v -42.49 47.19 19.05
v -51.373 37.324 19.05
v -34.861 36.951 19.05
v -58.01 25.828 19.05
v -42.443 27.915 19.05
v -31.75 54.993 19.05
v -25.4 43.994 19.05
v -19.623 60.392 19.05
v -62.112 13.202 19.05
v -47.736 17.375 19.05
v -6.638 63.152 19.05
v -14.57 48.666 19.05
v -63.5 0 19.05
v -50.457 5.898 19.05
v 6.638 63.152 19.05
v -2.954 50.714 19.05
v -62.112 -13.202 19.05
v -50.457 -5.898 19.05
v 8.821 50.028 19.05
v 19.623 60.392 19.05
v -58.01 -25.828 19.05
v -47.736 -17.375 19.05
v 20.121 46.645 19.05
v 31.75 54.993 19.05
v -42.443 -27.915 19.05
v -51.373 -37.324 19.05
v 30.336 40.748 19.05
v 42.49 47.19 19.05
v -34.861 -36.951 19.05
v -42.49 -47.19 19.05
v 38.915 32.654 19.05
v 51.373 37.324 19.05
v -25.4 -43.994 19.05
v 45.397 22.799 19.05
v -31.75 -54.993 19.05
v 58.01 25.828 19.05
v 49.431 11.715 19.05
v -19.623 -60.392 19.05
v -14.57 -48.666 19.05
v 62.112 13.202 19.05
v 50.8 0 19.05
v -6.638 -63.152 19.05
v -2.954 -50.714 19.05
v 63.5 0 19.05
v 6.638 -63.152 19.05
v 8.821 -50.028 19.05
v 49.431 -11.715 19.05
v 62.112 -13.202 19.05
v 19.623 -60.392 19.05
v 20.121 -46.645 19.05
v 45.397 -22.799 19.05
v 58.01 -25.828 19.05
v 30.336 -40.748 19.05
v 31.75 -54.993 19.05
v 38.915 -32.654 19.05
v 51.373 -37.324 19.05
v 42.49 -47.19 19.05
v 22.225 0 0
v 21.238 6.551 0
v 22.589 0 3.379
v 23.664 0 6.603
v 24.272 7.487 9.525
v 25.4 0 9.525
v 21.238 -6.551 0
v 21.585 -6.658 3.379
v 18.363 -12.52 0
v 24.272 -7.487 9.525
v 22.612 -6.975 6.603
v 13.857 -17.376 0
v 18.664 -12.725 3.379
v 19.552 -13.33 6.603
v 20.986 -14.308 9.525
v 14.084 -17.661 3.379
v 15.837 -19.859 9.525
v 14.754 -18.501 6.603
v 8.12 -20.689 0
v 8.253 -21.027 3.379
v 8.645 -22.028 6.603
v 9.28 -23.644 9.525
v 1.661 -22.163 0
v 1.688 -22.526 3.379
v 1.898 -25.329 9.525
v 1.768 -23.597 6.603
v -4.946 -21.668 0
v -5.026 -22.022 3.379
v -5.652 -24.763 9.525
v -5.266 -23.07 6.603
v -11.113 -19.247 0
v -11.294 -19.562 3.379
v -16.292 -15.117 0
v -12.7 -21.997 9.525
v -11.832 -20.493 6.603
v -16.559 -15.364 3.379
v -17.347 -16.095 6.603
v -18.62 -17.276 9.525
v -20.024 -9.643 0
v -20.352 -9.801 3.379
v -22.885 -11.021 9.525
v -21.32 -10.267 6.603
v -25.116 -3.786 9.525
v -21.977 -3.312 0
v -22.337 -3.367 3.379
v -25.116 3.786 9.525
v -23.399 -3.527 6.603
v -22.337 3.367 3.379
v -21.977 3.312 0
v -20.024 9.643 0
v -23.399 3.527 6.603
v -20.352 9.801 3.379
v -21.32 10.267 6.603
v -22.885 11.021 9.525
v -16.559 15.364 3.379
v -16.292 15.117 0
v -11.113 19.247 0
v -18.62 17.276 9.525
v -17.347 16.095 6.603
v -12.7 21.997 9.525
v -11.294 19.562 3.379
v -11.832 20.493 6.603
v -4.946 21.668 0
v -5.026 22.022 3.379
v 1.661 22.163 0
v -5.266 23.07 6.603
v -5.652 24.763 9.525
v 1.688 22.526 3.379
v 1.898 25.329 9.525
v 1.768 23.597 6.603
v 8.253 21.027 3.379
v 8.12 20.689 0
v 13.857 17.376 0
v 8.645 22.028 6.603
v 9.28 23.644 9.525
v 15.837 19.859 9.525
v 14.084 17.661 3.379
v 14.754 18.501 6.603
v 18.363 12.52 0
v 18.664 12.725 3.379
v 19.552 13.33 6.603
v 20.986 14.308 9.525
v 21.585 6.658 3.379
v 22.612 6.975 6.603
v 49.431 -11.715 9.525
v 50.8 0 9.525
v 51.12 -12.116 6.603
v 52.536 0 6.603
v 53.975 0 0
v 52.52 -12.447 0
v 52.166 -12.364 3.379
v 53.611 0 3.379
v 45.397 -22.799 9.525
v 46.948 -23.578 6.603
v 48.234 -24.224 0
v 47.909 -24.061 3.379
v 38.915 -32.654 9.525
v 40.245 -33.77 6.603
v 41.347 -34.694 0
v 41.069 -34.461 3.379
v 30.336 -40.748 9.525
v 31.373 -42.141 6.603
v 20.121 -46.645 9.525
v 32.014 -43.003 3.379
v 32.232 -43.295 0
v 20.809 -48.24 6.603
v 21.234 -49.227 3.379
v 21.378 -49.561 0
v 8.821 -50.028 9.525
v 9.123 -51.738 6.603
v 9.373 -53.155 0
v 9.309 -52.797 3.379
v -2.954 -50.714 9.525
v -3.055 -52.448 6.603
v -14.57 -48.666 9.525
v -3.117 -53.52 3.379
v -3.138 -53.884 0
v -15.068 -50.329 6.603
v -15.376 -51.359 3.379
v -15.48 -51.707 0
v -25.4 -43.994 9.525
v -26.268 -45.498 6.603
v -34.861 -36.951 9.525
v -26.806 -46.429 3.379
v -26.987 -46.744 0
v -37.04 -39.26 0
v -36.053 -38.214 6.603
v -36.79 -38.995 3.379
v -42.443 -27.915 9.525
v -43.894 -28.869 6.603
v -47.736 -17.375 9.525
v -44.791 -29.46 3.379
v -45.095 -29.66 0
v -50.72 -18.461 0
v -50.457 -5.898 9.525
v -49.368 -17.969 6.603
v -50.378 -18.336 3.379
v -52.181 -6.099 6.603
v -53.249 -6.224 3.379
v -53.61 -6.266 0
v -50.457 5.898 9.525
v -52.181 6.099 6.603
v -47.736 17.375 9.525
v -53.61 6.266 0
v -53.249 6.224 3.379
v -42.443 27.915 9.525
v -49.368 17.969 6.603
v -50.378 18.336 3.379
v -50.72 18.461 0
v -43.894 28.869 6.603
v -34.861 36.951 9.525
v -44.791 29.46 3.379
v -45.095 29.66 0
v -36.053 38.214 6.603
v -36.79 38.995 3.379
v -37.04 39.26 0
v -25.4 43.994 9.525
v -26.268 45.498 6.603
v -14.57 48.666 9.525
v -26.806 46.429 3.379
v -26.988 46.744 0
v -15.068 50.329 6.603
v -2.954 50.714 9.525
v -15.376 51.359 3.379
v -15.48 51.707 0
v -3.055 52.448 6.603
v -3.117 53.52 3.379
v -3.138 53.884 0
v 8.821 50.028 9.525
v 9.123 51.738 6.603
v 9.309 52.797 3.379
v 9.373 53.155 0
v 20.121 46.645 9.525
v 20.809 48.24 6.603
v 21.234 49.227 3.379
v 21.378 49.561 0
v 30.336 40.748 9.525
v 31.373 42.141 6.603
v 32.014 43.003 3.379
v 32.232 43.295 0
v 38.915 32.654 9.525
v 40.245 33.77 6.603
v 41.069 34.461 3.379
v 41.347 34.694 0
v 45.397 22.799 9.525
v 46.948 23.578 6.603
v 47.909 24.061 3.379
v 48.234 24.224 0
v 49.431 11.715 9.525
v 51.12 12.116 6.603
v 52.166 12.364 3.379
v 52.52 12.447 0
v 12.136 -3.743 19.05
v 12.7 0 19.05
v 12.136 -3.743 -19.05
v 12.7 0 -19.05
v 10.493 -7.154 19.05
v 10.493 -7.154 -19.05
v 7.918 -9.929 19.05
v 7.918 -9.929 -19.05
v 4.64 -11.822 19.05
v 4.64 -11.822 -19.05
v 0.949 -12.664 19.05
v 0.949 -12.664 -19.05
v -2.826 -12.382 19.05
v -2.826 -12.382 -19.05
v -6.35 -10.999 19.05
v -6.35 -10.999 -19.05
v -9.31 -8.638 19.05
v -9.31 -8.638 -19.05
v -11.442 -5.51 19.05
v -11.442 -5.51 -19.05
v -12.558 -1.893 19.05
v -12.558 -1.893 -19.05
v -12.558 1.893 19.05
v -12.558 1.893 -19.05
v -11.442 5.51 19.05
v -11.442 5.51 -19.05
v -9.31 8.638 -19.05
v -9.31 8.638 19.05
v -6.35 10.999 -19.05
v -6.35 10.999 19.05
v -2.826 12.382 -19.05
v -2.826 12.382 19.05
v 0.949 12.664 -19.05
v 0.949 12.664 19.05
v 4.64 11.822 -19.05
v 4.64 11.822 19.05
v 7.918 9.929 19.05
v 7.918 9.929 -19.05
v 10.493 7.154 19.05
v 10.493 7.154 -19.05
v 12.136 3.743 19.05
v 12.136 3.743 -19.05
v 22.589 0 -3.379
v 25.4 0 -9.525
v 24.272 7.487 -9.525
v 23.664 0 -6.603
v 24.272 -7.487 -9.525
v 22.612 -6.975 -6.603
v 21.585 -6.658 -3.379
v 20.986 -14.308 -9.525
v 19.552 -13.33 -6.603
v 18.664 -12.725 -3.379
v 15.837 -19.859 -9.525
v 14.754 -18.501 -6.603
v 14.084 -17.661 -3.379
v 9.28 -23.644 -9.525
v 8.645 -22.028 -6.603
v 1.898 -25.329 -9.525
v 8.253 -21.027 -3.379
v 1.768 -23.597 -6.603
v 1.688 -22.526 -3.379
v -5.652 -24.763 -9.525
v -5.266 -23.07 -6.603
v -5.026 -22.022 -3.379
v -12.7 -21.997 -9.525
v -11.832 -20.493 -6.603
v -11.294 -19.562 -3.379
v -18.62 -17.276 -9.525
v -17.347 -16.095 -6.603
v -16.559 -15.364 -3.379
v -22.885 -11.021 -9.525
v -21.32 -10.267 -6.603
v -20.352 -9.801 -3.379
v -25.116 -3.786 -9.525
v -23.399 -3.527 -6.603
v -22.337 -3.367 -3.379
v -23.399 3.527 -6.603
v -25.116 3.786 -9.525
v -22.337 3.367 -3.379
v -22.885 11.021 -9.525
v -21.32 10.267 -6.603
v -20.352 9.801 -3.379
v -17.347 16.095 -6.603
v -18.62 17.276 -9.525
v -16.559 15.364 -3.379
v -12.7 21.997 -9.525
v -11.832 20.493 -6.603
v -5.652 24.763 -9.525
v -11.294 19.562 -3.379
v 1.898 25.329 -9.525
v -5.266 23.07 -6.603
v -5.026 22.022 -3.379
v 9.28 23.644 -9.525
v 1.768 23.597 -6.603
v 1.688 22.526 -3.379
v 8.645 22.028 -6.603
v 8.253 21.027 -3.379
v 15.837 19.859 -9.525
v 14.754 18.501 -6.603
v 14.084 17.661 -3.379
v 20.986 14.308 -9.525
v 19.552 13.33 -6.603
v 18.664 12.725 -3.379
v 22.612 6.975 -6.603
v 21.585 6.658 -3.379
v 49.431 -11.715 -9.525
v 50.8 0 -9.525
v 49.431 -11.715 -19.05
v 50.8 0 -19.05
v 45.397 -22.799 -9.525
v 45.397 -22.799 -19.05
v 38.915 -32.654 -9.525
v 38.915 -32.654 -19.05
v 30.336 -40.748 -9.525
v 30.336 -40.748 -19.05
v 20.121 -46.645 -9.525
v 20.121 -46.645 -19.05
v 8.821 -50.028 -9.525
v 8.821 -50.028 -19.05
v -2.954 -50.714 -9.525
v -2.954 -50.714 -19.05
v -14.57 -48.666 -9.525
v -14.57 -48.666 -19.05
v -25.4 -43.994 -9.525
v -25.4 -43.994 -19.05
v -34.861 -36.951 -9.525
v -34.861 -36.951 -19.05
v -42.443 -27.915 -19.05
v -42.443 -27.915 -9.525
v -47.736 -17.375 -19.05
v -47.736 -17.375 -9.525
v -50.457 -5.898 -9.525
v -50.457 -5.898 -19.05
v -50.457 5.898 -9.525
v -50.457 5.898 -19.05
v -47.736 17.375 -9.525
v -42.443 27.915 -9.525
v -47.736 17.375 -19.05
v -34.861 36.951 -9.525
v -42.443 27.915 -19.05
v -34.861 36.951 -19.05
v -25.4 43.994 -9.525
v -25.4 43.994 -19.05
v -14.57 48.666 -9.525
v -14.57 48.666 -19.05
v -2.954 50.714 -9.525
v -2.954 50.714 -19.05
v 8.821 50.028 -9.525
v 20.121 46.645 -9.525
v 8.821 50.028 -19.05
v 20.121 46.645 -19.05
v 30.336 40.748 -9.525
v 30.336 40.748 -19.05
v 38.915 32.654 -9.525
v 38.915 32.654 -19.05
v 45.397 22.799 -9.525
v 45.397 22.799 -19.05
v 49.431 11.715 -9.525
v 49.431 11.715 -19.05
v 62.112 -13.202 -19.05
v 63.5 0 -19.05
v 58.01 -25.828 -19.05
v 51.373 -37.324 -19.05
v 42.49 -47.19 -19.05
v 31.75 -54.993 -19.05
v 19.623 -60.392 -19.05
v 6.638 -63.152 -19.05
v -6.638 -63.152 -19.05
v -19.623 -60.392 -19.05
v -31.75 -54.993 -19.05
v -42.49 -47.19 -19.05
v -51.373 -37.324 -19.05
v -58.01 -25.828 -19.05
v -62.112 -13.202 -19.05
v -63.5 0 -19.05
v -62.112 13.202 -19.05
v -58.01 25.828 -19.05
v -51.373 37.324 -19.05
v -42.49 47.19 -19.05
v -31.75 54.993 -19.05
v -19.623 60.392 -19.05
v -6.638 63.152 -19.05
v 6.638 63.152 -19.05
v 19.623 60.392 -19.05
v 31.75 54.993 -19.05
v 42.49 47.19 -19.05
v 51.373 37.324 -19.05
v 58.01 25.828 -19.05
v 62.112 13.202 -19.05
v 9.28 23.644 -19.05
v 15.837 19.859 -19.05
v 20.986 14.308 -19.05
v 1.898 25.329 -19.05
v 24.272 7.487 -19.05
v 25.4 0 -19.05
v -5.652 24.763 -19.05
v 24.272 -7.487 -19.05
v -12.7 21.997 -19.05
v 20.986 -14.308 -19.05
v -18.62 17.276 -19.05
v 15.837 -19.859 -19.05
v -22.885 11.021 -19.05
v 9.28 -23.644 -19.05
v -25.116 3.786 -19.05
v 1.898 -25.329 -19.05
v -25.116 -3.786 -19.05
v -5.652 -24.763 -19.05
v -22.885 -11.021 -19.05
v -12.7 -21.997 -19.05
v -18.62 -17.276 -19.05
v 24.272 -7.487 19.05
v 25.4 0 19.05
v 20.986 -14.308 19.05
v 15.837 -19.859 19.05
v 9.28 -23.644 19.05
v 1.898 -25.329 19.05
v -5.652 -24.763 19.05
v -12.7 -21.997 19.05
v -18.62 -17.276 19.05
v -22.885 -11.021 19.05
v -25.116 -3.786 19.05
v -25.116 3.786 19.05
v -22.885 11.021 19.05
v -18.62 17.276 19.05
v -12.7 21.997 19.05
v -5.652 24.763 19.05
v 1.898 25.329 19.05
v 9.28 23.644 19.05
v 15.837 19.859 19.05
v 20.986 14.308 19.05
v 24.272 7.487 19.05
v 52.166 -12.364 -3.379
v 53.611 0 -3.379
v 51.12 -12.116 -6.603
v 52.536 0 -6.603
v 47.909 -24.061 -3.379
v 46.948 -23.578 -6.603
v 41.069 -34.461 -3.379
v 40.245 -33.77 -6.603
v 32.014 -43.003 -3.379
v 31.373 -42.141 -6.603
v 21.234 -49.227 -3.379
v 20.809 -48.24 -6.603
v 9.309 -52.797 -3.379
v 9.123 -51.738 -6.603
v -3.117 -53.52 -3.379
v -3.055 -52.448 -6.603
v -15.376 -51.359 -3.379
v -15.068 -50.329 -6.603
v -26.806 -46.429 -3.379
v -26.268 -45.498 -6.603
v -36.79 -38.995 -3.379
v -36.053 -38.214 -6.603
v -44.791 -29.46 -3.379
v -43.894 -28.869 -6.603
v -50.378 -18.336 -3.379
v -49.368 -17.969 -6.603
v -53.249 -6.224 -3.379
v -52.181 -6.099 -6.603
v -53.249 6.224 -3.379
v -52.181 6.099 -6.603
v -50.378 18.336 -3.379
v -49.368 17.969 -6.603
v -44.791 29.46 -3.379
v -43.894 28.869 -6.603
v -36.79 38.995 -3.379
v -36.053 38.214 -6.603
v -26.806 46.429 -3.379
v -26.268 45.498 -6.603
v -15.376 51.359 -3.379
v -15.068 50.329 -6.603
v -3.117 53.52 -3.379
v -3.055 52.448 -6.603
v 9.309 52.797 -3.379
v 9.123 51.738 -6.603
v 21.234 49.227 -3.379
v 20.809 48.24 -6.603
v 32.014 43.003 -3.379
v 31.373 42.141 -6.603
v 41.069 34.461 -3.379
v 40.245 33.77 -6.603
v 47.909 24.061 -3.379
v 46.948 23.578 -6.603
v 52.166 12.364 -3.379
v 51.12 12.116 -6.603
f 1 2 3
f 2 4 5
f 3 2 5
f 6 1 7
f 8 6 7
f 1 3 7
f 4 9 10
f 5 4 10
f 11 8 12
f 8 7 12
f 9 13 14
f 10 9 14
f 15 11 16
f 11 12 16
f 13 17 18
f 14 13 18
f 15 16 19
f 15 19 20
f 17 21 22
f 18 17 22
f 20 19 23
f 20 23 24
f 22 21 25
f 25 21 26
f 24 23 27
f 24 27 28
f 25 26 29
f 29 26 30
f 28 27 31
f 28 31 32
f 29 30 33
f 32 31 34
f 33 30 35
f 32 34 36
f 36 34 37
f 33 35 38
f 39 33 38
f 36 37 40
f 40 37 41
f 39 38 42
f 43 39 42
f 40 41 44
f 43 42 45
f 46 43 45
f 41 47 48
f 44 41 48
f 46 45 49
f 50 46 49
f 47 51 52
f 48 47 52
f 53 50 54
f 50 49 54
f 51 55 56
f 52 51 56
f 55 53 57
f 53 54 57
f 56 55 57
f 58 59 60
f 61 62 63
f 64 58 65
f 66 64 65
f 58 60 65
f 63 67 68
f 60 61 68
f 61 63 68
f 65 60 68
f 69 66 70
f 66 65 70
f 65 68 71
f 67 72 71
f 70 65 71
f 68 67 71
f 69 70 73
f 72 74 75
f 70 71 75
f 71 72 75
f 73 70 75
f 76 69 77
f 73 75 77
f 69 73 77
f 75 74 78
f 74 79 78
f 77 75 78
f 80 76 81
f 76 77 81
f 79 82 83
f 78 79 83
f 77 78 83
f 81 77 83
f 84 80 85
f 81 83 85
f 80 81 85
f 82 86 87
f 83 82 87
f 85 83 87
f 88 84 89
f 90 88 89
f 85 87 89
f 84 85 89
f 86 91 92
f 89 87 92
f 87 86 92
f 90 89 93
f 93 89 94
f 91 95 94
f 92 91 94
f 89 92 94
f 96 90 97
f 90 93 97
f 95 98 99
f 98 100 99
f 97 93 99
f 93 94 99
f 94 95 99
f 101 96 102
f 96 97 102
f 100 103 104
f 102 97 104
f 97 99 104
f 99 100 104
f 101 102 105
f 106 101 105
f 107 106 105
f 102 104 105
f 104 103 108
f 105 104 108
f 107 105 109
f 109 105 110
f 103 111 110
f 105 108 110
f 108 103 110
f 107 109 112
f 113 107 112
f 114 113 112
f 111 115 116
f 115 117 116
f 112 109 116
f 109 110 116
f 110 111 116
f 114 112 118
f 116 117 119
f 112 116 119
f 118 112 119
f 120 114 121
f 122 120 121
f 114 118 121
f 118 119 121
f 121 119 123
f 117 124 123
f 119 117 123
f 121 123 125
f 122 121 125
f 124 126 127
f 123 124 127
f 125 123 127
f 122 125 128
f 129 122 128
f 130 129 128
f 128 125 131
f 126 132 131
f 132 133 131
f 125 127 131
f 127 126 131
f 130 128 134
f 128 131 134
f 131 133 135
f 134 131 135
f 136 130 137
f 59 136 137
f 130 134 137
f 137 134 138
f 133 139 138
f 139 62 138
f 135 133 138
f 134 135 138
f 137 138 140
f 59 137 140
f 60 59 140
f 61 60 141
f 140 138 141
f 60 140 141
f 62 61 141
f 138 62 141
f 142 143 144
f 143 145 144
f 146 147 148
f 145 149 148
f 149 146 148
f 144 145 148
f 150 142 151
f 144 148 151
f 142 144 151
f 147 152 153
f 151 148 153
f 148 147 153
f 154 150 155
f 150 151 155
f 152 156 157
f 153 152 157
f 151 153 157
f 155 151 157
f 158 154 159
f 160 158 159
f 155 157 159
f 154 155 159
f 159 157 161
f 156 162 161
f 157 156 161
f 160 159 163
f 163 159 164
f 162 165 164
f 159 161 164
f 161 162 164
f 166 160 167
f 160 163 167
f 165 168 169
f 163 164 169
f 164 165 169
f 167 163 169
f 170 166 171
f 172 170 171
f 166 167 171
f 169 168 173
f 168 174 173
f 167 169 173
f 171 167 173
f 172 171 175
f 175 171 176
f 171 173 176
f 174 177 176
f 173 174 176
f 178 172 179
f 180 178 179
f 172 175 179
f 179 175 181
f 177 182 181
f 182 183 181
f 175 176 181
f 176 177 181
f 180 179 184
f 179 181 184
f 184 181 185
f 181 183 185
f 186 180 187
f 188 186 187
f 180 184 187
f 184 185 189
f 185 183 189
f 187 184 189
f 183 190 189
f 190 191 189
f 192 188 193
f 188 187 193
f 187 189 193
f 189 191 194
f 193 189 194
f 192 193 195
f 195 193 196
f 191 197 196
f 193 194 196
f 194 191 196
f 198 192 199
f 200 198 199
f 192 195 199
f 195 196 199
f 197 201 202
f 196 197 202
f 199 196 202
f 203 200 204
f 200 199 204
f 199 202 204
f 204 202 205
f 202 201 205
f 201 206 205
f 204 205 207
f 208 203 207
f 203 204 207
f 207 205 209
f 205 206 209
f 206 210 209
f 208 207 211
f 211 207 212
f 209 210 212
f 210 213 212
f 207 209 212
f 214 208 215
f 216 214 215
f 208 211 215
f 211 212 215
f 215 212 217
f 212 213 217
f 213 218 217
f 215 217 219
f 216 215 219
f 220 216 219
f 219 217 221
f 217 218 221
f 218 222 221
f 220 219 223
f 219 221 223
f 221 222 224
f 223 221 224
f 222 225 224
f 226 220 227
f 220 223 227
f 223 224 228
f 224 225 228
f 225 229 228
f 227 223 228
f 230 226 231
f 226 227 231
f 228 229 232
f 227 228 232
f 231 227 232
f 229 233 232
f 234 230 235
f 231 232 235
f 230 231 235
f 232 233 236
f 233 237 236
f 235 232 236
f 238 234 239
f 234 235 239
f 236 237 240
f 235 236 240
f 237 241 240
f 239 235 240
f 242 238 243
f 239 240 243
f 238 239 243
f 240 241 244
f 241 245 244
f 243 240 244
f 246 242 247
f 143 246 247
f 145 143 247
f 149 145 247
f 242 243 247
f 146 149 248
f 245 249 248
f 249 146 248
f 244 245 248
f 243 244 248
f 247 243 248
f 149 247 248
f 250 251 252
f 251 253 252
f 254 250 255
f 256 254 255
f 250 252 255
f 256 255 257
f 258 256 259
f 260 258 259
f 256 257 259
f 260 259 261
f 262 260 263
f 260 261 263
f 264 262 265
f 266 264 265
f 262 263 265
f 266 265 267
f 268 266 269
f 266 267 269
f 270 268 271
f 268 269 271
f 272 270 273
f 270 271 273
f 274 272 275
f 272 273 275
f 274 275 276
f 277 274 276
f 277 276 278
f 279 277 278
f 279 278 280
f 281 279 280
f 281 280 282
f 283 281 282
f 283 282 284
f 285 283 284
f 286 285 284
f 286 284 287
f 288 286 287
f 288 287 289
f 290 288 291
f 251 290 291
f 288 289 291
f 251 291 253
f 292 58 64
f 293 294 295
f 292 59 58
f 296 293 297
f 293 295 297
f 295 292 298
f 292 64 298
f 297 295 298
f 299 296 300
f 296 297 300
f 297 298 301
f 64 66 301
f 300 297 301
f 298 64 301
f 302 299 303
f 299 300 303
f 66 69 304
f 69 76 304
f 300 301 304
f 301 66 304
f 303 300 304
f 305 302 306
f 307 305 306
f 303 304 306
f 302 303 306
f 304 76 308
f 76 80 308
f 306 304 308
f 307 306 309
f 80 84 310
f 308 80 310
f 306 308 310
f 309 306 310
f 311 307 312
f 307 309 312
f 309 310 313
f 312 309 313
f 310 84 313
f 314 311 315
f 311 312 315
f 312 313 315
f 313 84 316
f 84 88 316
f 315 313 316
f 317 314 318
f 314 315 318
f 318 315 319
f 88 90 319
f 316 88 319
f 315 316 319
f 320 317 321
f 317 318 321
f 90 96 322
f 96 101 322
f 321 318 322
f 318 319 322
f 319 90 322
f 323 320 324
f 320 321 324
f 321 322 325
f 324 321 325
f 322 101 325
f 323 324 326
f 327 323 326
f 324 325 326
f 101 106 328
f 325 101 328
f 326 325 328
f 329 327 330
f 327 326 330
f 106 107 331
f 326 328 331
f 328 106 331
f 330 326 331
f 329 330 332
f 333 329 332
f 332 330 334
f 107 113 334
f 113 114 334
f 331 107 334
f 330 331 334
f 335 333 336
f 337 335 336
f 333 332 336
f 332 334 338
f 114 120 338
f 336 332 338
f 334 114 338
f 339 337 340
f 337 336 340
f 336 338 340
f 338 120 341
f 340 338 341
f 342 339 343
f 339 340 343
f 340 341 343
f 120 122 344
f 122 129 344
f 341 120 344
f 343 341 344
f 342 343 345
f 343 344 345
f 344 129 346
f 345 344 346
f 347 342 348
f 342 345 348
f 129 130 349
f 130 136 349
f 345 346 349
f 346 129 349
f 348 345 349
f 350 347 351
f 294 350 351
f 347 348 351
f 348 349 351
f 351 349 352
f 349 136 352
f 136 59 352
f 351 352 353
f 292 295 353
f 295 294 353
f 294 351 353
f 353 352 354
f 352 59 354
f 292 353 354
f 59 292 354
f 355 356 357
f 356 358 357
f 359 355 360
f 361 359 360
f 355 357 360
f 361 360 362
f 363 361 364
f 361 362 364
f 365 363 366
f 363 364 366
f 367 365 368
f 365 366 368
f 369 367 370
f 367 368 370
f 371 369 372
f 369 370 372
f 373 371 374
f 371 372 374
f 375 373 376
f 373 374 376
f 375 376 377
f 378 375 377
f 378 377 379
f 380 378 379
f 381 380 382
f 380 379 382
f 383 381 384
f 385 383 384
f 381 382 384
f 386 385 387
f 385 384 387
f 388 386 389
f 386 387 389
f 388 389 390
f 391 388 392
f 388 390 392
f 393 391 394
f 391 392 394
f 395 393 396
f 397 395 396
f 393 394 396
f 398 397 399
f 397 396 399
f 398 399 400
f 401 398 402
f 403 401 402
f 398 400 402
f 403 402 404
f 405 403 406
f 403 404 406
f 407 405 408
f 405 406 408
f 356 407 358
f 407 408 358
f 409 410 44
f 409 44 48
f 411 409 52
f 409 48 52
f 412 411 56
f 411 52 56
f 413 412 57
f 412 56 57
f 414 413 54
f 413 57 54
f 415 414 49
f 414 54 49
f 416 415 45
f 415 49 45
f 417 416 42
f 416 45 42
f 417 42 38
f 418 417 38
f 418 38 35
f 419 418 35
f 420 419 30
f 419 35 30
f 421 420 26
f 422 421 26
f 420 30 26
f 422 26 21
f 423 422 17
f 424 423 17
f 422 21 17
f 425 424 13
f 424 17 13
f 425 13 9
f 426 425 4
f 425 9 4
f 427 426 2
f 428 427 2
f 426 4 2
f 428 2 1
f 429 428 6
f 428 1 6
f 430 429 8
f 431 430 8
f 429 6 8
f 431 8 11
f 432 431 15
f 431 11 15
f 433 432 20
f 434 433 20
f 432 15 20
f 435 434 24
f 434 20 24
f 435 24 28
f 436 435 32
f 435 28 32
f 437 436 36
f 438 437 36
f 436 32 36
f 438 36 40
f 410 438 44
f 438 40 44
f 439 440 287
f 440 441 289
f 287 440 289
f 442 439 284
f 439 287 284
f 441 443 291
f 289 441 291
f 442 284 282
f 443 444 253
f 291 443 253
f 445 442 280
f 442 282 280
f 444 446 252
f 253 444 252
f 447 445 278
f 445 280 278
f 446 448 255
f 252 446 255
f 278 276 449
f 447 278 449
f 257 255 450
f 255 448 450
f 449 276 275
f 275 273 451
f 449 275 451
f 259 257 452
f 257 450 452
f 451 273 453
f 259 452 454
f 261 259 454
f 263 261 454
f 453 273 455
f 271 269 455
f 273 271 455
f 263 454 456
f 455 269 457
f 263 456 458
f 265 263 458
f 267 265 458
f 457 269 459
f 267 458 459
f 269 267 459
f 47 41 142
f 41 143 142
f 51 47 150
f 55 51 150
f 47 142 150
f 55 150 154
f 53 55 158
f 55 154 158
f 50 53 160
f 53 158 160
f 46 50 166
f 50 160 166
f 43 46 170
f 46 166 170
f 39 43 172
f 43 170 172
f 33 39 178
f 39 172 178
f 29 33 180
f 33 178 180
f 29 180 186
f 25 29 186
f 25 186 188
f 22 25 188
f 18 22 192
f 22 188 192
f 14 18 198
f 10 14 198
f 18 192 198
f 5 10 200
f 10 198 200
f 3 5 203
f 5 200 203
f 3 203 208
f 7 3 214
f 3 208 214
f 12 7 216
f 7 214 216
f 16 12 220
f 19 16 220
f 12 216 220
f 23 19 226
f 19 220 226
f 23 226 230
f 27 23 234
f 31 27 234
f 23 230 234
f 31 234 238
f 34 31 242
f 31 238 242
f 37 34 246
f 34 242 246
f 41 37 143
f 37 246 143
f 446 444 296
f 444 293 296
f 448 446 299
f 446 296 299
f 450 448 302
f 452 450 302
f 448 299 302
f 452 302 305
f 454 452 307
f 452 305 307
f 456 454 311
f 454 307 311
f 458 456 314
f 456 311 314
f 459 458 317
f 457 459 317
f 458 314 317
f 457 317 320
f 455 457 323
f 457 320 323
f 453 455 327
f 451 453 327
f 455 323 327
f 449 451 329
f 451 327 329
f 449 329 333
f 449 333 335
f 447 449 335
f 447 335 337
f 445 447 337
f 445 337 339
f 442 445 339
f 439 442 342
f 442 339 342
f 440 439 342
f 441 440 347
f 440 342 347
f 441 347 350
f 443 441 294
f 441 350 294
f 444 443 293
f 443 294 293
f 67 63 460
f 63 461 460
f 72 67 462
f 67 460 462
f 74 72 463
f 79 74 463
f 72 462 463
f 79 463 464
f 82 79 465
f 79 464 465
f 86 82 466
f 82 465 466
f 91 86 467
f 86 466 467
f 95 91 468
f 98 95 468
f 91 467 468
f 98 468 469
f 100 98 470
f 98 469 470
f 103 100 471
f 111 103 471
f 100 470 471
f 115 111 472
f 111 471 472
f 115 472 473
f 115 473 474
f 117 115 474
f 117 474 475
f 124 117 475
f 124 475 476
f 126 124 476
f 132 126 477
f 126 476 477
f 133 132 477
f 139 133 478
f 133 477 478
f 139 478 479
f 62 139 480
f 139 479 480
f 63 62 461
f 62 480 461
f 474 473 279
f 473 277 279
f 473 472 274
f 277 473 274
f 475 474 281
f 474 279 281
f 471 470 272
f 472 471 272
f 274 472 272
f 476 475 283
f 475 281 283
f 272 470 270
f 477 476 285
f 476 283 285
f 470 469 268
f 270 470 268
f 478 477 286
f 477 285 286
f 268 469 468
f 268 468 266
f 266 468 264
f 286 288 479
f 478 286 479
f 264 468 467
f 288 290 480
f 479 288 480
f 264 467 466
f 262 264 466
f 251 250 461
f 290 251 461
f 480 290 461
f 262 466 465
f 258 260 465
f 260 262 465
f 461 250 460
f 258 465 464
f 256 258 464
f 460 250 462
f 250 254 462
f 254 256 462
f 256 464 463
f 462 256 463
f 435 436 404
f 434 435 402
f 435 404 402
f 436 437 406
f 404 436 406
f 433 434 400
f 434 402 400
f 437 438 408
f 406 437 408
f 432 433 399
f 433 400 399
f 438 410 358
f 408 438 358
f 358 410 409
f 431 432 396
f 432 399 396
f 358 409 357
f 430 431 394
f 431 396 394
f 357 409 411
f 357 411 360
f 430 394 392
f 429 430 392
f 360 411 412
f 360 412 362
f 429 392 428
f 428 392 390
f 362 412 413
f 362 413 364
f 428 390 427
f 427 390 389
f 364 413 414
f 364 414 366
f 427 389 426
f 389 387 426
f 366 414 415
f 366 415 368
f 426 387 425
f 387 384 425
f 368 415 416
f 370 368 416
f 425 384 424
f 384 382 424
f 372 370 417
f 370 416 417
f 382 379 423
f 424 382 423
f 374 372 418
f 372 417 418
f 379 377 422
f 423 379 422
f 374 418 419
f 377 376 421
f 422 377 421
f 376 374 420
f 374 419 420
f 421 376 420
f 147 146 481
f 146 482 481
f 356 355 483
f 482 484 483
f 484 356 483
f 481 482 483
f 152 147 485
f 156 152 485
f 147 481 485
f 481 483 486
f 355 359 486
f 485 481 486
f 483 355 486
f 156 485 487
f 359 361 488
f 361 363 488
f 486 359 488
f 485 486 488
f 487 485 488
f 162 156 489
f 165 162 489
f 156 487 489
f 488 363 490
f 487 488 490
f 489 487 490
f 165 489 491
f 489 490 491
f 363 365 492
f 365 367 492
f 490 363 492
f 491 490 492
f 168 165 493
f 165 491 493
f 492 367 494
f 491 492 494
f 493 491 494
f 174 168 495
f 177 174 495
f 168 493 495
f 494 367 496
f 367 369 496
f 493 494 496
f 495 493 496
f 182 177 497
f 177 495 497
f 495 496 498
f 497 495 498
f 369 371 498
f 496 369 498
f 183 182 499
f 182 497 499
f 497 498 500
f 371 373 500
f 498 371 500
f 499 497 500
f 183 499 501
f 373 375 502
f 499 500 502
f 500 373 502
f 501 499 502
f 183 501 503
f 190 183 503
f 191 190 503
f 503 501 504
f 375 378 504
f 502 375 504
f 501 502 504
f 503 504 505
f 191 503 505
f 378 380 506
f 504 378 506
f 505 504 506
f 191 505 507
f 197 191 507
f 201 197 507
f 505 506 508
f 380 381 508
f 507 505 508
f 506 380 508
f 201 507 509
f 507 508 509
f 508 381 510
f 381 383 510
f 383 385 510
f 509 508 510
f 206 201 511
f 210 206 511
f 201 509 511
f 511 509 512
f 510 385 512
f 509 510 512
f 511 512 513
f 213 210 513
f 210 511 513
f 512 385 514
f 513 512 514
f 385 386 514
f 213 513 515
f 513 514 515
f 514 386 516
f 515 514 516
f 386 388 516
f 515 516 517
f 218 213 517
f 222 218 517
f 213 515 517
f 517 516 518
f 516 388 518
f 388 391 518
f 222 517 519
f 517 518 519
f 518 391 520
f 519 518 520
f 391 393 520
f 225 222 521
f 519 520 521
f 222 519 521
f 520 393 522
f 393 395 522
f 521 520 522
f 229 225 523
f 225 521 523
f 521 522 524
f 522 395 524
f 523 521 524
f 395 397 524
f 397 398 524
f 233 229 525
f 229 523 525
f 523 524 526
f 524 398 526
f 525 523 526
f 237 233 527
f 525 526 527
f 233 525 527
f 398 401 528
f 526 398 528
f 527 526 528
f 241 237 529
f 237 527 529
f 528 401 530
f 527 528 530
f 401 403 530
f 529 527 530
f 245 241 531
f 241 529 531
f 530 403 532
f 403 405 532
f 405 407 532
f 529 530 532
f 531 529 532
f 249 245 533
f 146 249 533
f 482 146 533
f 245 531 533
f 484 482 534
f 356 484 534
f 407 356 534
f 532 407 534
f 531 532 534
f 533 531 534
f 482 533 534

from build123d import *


with BuildPart() as f1:
    # F0 (on Front) → F1 (revolve)
    with BuildSketch(Plane.XZ):
        with BuildLine():
            Line((25.4, 19.05), (12.7, 19.05))
            Line((12.7, 19.05), (12.7, -19.05))
            Line((12.7, -19.05), (25.4, -19.05))
            Line((25.4, -19.05), (25.4, -9.525))
            ThreePointArc((25.4, -9.525), (23.039653, -5.020116), (22.225, 0))
            ThreePointArc((22.225, 0), (23.039653, 5.020116), (25.4, 9.525))
            Line((25.4, 9.525), (25.4, 19.05))
        make_face()
        with BuildLine():
            Line((50.8, 19.05), (50.8, 9.525))
            ThreePointArc((50.8, 9.525), (53.160347, 5.020116), (53.975, 0))
            ThreePointArc((53.975, 0), (53.160347, -5.020116), (50.8, -9.525))
            Line((50.8, -9.525), (50.8, -19.05))
            Line((50.8, -19.05), (63.5, -19.05))
            Line((63.5, -19.05), (63.5, 19.05))
            Line((63.5, 19.05), (50.8, 19.05))
        make_face()
    revolve(axis=Axis((0, 0, 0), (0, 0, -1)))


solid = f1.part
